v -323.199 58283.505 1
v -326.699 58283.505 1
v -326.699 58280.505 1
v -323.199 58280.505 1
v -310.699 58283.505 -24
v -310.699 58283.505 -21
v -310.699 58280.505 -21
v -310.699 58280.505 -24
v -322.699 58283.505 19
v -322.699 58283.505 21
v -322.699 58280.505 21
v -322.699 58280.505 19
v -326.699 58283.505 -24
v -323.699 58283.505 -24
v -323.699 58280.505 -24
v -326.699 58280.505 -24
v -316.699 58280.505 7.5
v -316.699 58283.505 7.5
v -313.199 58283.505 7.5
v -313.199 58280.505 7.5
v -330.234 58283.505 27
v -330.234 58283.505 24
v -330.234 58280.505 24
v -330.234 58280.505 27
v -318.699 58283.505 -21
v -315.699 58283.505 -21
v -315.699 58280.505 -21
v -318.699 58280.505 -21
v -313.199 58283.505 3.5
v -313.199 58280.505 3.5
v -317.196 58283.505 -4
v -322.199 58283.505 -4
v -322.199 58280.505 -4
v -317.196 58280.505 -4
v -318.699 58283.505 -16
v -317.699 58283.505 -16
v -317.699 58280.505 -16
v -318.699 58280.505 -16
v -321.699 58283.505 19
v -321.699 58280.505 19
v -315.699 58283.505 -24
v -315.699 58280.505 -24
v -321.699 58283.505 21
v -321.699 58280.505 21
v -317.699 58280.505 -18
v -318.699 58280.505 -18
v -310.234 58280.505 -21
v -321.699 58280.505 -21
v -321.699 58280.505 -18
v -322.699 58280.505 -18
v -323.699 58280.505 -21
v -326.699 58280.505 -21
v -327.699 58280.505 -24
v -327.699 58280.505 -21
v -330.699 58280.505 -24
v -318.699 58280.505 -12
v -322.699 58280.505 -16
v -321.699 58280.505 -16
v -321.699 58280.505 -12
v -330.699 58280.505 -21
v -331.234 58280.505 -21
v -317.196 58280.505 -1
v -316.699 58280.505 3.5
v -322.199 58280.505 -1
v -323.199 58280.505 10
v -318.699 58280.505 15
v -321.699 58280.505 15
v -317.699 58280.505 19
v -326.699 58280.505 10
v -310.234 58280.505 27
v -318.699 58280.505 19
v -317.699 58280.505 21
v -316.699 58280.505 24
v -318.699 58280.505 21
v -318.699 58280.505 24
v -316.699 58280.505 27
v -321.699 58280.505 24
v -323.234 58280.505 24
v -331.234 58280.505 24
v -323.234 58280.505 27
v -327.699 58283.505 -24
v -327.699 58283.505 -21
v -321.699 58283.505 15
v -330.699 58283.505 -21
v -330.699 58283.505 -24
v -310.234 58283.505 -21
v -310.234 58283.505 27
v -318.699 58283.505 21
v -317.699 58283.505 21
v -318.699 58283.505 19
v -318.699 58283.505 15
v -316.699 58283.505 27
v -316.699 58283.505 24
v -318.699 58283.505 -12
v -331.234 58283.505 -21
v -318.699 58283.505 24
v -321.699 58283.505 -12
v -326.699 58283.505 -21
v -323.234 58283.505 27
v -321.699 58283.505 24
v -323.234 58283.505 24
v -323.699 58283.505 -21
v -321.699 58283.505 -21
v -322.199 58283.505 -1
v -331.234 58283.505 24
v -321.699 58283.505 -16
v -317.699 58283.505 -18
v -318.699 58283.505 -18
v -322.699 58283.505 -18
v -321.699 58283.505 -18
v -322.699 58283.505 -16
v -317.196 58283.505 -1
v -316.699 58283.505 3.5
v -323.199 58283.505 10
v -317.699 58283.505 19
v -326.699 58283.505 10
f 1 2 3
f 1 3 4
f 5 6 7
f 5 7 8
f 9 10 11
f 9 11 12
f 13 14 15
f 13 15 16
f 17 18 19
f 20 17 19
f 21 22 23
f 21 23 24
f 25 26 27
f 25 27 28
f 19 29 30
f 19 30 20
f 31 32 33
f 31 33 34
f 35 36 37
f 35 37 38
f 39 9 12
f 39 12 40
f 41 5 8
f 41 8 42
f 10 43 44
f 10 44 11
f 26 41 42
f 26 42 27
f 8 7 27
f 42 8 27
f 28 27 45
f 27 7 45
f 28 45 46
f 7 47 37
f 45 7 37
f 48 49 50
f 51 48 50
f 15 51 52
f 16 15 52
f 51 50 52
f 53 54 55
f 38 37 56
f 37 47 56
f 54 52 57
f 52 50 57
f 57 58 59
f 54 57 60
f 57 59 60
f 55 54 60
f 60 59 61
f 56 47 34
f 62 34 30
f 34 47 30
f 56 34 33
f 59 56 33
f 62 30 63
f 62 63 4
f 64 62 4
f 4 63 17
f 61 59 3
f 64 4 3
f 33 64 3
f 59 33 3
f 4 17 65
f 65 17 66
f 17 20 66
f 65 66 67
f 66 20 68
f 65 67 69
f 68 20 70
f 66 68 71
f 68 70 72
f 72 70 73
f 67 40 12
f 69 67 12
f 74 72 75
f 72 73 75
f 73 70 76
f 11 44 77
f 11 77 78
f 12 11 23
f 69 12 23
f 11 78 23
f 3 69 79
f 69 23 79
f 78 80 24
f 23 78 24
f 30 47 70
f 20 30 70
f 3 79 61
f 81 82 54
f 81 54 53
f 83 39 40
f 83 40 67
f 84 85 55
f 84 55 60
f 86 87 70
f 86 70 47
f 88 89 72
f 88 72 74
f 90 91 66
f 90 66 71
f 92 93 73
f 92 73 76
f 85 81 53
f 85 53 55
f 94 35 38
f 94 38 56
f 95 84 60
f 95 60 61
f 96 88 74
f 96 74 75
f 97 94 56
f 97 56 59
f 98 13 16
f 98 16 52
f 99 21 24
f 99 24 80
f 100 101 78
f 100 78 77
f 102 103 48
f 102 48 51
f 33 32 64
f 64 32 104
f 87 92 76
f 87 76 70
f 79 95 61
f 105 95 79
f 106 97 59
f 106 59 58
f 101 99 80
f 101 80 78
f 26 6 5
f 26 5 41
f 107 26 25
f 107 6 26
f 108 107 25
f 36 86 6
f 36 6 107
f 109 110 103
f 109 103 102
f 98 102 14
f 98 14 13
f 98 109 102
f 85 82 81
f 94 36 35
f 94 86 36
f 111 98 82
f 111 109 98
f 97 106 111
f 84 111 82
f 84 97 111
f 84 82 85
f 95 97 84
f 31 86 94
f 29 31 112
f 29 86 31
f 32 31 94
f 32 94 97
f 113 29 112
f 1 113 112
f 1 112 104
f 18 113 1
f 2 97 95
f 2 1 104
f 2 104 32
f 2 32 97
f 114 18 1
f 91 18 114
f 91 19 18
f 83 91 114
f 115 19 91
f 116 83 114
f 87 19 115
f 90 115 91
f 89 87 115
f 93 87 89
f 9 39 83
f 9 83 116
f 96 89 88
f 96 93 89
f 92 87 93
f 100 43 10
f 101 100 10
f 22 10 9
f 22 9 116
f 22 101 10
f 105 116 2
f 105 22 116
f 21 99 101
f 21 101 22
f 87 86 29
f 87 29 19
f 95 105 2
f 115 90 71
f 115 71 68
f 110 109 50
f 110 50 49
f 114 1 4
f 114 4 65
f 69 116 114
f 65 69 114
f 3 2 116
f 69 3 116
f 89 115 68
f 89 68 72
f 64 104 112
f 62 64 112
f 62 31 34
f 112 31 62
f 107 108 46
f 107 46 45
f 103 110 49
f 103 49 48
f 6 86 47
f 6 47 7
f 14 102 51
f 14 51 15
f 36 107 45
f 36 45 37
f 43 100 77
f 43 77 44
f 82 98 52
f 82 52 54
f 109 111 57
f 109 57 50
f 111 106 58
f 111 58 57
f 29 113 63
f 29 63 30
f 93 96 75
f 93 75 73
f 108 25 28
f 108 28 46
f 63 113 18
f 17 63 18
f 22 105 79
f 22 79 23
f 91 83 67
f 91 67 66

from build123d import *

# Parameters (mm, degrees)
CROQUIS1_W                 = 3.5
CROQUIS1_H                 = 9
CROQUIS1_H_2               = 4
CROQUIS1_W_2               = 5.00348191
CROQUIS1_H_3               = 3.000000003
SALIENTE_EXTRUIR1_DEPTH    = 3
S_LIDO_MOVER_COPIAR1_ANGLE = 90


with BuildPart() as part:
    # Croquis1 → Saliente-Extruir1 (new body)
    with BuildSketch(Plane.XY):
        Polygon((-323.234450912, 58307.505235193), (-323.234450912, 58304.505235193), (-321.699124199, 58304.505235193), (-321.699124199, 58301.505235193), (-322.699124199, 58301.505235193), (-322.699124199, 58299.505235193), (-321.699124199, 58299.505235193), (-321.699124199, 58295.505235193), (-318.699124199, 58295.505235193), (-318.699124199, 58299.505235193), (-317.699124199, 58299.505235193), (-317.699124199, 58301.505235193), (-318.699124199, 58301.505235193), (-318.699124199, 58304.505235193), (-316.699124199, 58304.505235193), (-316.699124199, 58307.505235193), (-310.234450912, 58307.505235193), (-310.234450912, 58259.505235194), (-310.699124199, 58259.505235194), (-310.699124199, 58256.505235193), (-315.699124199, 58256.505235193), (-315.699124199, 58259.505235193), (-318.699124199, 58259.505235193), (-318.699124199, 58262.505235193), (-317.699124199, 58262.505235193), (-317.699124199, 58264.505235193), (-318.699124199, 58264.505235193), (-318.699124199, 58268.505235193), (-321.699124199, 58268.505235193), (-321.699124199, 58264.505235193), (-322.699124199, 58264.505235193), (-322.699124199, 58262.505235193), (-321.699124199, 58262.505235193), (-321.699124199, 58259.505235193), (-323.699124199, 58259.505235193), (-323.699124199, 58256.505235193), (-326.699124199, 58256.505235193), (-326.699124199, 58259.505235193), (-327.699124199, 58259.505235193), (-327.699124199, 58256.505235193), (-330.699124199, 58256.505235193), (-330.699124199, 58259.505235194), (-331.234450912, 58259.505235194), (-331.234450912, 58304.505235193), (-330.234450912, 58304.505235193), (-330.234450912, 58307.505235193), align=None)
        with Locations((-324.949124199, 58286.005235193)):
            Rectangle(CROQUIS1_W, CROQUIS1_H, mode=Mode.SUBTRACT)
        with Locations((-314.949124199, 58286.005235193)):
            Rectangle(CROQUIS1_W, CROQUIS1_H_2, mode=Mode.SUBTRACT)
        with Locations((-319.697383244, 58278.005235192)):
            Rectangle(CROQUIS1_W_2, CROQUIS1_H_3, mode=Mode.SUBTRACT)
    extrude(amount=SALIENTE_EXTRUIR1_DEPTH)


with BuildPart() as part_1:
    # Sólido-Mover/Copiar1: moved
    add(part.part.rotate(Axis((0, 58282.005235193, 1.5), (1, 0, 0)), S_LIDO_MOVER_COPIAR1_ANGLE))


solid = part_1.part
